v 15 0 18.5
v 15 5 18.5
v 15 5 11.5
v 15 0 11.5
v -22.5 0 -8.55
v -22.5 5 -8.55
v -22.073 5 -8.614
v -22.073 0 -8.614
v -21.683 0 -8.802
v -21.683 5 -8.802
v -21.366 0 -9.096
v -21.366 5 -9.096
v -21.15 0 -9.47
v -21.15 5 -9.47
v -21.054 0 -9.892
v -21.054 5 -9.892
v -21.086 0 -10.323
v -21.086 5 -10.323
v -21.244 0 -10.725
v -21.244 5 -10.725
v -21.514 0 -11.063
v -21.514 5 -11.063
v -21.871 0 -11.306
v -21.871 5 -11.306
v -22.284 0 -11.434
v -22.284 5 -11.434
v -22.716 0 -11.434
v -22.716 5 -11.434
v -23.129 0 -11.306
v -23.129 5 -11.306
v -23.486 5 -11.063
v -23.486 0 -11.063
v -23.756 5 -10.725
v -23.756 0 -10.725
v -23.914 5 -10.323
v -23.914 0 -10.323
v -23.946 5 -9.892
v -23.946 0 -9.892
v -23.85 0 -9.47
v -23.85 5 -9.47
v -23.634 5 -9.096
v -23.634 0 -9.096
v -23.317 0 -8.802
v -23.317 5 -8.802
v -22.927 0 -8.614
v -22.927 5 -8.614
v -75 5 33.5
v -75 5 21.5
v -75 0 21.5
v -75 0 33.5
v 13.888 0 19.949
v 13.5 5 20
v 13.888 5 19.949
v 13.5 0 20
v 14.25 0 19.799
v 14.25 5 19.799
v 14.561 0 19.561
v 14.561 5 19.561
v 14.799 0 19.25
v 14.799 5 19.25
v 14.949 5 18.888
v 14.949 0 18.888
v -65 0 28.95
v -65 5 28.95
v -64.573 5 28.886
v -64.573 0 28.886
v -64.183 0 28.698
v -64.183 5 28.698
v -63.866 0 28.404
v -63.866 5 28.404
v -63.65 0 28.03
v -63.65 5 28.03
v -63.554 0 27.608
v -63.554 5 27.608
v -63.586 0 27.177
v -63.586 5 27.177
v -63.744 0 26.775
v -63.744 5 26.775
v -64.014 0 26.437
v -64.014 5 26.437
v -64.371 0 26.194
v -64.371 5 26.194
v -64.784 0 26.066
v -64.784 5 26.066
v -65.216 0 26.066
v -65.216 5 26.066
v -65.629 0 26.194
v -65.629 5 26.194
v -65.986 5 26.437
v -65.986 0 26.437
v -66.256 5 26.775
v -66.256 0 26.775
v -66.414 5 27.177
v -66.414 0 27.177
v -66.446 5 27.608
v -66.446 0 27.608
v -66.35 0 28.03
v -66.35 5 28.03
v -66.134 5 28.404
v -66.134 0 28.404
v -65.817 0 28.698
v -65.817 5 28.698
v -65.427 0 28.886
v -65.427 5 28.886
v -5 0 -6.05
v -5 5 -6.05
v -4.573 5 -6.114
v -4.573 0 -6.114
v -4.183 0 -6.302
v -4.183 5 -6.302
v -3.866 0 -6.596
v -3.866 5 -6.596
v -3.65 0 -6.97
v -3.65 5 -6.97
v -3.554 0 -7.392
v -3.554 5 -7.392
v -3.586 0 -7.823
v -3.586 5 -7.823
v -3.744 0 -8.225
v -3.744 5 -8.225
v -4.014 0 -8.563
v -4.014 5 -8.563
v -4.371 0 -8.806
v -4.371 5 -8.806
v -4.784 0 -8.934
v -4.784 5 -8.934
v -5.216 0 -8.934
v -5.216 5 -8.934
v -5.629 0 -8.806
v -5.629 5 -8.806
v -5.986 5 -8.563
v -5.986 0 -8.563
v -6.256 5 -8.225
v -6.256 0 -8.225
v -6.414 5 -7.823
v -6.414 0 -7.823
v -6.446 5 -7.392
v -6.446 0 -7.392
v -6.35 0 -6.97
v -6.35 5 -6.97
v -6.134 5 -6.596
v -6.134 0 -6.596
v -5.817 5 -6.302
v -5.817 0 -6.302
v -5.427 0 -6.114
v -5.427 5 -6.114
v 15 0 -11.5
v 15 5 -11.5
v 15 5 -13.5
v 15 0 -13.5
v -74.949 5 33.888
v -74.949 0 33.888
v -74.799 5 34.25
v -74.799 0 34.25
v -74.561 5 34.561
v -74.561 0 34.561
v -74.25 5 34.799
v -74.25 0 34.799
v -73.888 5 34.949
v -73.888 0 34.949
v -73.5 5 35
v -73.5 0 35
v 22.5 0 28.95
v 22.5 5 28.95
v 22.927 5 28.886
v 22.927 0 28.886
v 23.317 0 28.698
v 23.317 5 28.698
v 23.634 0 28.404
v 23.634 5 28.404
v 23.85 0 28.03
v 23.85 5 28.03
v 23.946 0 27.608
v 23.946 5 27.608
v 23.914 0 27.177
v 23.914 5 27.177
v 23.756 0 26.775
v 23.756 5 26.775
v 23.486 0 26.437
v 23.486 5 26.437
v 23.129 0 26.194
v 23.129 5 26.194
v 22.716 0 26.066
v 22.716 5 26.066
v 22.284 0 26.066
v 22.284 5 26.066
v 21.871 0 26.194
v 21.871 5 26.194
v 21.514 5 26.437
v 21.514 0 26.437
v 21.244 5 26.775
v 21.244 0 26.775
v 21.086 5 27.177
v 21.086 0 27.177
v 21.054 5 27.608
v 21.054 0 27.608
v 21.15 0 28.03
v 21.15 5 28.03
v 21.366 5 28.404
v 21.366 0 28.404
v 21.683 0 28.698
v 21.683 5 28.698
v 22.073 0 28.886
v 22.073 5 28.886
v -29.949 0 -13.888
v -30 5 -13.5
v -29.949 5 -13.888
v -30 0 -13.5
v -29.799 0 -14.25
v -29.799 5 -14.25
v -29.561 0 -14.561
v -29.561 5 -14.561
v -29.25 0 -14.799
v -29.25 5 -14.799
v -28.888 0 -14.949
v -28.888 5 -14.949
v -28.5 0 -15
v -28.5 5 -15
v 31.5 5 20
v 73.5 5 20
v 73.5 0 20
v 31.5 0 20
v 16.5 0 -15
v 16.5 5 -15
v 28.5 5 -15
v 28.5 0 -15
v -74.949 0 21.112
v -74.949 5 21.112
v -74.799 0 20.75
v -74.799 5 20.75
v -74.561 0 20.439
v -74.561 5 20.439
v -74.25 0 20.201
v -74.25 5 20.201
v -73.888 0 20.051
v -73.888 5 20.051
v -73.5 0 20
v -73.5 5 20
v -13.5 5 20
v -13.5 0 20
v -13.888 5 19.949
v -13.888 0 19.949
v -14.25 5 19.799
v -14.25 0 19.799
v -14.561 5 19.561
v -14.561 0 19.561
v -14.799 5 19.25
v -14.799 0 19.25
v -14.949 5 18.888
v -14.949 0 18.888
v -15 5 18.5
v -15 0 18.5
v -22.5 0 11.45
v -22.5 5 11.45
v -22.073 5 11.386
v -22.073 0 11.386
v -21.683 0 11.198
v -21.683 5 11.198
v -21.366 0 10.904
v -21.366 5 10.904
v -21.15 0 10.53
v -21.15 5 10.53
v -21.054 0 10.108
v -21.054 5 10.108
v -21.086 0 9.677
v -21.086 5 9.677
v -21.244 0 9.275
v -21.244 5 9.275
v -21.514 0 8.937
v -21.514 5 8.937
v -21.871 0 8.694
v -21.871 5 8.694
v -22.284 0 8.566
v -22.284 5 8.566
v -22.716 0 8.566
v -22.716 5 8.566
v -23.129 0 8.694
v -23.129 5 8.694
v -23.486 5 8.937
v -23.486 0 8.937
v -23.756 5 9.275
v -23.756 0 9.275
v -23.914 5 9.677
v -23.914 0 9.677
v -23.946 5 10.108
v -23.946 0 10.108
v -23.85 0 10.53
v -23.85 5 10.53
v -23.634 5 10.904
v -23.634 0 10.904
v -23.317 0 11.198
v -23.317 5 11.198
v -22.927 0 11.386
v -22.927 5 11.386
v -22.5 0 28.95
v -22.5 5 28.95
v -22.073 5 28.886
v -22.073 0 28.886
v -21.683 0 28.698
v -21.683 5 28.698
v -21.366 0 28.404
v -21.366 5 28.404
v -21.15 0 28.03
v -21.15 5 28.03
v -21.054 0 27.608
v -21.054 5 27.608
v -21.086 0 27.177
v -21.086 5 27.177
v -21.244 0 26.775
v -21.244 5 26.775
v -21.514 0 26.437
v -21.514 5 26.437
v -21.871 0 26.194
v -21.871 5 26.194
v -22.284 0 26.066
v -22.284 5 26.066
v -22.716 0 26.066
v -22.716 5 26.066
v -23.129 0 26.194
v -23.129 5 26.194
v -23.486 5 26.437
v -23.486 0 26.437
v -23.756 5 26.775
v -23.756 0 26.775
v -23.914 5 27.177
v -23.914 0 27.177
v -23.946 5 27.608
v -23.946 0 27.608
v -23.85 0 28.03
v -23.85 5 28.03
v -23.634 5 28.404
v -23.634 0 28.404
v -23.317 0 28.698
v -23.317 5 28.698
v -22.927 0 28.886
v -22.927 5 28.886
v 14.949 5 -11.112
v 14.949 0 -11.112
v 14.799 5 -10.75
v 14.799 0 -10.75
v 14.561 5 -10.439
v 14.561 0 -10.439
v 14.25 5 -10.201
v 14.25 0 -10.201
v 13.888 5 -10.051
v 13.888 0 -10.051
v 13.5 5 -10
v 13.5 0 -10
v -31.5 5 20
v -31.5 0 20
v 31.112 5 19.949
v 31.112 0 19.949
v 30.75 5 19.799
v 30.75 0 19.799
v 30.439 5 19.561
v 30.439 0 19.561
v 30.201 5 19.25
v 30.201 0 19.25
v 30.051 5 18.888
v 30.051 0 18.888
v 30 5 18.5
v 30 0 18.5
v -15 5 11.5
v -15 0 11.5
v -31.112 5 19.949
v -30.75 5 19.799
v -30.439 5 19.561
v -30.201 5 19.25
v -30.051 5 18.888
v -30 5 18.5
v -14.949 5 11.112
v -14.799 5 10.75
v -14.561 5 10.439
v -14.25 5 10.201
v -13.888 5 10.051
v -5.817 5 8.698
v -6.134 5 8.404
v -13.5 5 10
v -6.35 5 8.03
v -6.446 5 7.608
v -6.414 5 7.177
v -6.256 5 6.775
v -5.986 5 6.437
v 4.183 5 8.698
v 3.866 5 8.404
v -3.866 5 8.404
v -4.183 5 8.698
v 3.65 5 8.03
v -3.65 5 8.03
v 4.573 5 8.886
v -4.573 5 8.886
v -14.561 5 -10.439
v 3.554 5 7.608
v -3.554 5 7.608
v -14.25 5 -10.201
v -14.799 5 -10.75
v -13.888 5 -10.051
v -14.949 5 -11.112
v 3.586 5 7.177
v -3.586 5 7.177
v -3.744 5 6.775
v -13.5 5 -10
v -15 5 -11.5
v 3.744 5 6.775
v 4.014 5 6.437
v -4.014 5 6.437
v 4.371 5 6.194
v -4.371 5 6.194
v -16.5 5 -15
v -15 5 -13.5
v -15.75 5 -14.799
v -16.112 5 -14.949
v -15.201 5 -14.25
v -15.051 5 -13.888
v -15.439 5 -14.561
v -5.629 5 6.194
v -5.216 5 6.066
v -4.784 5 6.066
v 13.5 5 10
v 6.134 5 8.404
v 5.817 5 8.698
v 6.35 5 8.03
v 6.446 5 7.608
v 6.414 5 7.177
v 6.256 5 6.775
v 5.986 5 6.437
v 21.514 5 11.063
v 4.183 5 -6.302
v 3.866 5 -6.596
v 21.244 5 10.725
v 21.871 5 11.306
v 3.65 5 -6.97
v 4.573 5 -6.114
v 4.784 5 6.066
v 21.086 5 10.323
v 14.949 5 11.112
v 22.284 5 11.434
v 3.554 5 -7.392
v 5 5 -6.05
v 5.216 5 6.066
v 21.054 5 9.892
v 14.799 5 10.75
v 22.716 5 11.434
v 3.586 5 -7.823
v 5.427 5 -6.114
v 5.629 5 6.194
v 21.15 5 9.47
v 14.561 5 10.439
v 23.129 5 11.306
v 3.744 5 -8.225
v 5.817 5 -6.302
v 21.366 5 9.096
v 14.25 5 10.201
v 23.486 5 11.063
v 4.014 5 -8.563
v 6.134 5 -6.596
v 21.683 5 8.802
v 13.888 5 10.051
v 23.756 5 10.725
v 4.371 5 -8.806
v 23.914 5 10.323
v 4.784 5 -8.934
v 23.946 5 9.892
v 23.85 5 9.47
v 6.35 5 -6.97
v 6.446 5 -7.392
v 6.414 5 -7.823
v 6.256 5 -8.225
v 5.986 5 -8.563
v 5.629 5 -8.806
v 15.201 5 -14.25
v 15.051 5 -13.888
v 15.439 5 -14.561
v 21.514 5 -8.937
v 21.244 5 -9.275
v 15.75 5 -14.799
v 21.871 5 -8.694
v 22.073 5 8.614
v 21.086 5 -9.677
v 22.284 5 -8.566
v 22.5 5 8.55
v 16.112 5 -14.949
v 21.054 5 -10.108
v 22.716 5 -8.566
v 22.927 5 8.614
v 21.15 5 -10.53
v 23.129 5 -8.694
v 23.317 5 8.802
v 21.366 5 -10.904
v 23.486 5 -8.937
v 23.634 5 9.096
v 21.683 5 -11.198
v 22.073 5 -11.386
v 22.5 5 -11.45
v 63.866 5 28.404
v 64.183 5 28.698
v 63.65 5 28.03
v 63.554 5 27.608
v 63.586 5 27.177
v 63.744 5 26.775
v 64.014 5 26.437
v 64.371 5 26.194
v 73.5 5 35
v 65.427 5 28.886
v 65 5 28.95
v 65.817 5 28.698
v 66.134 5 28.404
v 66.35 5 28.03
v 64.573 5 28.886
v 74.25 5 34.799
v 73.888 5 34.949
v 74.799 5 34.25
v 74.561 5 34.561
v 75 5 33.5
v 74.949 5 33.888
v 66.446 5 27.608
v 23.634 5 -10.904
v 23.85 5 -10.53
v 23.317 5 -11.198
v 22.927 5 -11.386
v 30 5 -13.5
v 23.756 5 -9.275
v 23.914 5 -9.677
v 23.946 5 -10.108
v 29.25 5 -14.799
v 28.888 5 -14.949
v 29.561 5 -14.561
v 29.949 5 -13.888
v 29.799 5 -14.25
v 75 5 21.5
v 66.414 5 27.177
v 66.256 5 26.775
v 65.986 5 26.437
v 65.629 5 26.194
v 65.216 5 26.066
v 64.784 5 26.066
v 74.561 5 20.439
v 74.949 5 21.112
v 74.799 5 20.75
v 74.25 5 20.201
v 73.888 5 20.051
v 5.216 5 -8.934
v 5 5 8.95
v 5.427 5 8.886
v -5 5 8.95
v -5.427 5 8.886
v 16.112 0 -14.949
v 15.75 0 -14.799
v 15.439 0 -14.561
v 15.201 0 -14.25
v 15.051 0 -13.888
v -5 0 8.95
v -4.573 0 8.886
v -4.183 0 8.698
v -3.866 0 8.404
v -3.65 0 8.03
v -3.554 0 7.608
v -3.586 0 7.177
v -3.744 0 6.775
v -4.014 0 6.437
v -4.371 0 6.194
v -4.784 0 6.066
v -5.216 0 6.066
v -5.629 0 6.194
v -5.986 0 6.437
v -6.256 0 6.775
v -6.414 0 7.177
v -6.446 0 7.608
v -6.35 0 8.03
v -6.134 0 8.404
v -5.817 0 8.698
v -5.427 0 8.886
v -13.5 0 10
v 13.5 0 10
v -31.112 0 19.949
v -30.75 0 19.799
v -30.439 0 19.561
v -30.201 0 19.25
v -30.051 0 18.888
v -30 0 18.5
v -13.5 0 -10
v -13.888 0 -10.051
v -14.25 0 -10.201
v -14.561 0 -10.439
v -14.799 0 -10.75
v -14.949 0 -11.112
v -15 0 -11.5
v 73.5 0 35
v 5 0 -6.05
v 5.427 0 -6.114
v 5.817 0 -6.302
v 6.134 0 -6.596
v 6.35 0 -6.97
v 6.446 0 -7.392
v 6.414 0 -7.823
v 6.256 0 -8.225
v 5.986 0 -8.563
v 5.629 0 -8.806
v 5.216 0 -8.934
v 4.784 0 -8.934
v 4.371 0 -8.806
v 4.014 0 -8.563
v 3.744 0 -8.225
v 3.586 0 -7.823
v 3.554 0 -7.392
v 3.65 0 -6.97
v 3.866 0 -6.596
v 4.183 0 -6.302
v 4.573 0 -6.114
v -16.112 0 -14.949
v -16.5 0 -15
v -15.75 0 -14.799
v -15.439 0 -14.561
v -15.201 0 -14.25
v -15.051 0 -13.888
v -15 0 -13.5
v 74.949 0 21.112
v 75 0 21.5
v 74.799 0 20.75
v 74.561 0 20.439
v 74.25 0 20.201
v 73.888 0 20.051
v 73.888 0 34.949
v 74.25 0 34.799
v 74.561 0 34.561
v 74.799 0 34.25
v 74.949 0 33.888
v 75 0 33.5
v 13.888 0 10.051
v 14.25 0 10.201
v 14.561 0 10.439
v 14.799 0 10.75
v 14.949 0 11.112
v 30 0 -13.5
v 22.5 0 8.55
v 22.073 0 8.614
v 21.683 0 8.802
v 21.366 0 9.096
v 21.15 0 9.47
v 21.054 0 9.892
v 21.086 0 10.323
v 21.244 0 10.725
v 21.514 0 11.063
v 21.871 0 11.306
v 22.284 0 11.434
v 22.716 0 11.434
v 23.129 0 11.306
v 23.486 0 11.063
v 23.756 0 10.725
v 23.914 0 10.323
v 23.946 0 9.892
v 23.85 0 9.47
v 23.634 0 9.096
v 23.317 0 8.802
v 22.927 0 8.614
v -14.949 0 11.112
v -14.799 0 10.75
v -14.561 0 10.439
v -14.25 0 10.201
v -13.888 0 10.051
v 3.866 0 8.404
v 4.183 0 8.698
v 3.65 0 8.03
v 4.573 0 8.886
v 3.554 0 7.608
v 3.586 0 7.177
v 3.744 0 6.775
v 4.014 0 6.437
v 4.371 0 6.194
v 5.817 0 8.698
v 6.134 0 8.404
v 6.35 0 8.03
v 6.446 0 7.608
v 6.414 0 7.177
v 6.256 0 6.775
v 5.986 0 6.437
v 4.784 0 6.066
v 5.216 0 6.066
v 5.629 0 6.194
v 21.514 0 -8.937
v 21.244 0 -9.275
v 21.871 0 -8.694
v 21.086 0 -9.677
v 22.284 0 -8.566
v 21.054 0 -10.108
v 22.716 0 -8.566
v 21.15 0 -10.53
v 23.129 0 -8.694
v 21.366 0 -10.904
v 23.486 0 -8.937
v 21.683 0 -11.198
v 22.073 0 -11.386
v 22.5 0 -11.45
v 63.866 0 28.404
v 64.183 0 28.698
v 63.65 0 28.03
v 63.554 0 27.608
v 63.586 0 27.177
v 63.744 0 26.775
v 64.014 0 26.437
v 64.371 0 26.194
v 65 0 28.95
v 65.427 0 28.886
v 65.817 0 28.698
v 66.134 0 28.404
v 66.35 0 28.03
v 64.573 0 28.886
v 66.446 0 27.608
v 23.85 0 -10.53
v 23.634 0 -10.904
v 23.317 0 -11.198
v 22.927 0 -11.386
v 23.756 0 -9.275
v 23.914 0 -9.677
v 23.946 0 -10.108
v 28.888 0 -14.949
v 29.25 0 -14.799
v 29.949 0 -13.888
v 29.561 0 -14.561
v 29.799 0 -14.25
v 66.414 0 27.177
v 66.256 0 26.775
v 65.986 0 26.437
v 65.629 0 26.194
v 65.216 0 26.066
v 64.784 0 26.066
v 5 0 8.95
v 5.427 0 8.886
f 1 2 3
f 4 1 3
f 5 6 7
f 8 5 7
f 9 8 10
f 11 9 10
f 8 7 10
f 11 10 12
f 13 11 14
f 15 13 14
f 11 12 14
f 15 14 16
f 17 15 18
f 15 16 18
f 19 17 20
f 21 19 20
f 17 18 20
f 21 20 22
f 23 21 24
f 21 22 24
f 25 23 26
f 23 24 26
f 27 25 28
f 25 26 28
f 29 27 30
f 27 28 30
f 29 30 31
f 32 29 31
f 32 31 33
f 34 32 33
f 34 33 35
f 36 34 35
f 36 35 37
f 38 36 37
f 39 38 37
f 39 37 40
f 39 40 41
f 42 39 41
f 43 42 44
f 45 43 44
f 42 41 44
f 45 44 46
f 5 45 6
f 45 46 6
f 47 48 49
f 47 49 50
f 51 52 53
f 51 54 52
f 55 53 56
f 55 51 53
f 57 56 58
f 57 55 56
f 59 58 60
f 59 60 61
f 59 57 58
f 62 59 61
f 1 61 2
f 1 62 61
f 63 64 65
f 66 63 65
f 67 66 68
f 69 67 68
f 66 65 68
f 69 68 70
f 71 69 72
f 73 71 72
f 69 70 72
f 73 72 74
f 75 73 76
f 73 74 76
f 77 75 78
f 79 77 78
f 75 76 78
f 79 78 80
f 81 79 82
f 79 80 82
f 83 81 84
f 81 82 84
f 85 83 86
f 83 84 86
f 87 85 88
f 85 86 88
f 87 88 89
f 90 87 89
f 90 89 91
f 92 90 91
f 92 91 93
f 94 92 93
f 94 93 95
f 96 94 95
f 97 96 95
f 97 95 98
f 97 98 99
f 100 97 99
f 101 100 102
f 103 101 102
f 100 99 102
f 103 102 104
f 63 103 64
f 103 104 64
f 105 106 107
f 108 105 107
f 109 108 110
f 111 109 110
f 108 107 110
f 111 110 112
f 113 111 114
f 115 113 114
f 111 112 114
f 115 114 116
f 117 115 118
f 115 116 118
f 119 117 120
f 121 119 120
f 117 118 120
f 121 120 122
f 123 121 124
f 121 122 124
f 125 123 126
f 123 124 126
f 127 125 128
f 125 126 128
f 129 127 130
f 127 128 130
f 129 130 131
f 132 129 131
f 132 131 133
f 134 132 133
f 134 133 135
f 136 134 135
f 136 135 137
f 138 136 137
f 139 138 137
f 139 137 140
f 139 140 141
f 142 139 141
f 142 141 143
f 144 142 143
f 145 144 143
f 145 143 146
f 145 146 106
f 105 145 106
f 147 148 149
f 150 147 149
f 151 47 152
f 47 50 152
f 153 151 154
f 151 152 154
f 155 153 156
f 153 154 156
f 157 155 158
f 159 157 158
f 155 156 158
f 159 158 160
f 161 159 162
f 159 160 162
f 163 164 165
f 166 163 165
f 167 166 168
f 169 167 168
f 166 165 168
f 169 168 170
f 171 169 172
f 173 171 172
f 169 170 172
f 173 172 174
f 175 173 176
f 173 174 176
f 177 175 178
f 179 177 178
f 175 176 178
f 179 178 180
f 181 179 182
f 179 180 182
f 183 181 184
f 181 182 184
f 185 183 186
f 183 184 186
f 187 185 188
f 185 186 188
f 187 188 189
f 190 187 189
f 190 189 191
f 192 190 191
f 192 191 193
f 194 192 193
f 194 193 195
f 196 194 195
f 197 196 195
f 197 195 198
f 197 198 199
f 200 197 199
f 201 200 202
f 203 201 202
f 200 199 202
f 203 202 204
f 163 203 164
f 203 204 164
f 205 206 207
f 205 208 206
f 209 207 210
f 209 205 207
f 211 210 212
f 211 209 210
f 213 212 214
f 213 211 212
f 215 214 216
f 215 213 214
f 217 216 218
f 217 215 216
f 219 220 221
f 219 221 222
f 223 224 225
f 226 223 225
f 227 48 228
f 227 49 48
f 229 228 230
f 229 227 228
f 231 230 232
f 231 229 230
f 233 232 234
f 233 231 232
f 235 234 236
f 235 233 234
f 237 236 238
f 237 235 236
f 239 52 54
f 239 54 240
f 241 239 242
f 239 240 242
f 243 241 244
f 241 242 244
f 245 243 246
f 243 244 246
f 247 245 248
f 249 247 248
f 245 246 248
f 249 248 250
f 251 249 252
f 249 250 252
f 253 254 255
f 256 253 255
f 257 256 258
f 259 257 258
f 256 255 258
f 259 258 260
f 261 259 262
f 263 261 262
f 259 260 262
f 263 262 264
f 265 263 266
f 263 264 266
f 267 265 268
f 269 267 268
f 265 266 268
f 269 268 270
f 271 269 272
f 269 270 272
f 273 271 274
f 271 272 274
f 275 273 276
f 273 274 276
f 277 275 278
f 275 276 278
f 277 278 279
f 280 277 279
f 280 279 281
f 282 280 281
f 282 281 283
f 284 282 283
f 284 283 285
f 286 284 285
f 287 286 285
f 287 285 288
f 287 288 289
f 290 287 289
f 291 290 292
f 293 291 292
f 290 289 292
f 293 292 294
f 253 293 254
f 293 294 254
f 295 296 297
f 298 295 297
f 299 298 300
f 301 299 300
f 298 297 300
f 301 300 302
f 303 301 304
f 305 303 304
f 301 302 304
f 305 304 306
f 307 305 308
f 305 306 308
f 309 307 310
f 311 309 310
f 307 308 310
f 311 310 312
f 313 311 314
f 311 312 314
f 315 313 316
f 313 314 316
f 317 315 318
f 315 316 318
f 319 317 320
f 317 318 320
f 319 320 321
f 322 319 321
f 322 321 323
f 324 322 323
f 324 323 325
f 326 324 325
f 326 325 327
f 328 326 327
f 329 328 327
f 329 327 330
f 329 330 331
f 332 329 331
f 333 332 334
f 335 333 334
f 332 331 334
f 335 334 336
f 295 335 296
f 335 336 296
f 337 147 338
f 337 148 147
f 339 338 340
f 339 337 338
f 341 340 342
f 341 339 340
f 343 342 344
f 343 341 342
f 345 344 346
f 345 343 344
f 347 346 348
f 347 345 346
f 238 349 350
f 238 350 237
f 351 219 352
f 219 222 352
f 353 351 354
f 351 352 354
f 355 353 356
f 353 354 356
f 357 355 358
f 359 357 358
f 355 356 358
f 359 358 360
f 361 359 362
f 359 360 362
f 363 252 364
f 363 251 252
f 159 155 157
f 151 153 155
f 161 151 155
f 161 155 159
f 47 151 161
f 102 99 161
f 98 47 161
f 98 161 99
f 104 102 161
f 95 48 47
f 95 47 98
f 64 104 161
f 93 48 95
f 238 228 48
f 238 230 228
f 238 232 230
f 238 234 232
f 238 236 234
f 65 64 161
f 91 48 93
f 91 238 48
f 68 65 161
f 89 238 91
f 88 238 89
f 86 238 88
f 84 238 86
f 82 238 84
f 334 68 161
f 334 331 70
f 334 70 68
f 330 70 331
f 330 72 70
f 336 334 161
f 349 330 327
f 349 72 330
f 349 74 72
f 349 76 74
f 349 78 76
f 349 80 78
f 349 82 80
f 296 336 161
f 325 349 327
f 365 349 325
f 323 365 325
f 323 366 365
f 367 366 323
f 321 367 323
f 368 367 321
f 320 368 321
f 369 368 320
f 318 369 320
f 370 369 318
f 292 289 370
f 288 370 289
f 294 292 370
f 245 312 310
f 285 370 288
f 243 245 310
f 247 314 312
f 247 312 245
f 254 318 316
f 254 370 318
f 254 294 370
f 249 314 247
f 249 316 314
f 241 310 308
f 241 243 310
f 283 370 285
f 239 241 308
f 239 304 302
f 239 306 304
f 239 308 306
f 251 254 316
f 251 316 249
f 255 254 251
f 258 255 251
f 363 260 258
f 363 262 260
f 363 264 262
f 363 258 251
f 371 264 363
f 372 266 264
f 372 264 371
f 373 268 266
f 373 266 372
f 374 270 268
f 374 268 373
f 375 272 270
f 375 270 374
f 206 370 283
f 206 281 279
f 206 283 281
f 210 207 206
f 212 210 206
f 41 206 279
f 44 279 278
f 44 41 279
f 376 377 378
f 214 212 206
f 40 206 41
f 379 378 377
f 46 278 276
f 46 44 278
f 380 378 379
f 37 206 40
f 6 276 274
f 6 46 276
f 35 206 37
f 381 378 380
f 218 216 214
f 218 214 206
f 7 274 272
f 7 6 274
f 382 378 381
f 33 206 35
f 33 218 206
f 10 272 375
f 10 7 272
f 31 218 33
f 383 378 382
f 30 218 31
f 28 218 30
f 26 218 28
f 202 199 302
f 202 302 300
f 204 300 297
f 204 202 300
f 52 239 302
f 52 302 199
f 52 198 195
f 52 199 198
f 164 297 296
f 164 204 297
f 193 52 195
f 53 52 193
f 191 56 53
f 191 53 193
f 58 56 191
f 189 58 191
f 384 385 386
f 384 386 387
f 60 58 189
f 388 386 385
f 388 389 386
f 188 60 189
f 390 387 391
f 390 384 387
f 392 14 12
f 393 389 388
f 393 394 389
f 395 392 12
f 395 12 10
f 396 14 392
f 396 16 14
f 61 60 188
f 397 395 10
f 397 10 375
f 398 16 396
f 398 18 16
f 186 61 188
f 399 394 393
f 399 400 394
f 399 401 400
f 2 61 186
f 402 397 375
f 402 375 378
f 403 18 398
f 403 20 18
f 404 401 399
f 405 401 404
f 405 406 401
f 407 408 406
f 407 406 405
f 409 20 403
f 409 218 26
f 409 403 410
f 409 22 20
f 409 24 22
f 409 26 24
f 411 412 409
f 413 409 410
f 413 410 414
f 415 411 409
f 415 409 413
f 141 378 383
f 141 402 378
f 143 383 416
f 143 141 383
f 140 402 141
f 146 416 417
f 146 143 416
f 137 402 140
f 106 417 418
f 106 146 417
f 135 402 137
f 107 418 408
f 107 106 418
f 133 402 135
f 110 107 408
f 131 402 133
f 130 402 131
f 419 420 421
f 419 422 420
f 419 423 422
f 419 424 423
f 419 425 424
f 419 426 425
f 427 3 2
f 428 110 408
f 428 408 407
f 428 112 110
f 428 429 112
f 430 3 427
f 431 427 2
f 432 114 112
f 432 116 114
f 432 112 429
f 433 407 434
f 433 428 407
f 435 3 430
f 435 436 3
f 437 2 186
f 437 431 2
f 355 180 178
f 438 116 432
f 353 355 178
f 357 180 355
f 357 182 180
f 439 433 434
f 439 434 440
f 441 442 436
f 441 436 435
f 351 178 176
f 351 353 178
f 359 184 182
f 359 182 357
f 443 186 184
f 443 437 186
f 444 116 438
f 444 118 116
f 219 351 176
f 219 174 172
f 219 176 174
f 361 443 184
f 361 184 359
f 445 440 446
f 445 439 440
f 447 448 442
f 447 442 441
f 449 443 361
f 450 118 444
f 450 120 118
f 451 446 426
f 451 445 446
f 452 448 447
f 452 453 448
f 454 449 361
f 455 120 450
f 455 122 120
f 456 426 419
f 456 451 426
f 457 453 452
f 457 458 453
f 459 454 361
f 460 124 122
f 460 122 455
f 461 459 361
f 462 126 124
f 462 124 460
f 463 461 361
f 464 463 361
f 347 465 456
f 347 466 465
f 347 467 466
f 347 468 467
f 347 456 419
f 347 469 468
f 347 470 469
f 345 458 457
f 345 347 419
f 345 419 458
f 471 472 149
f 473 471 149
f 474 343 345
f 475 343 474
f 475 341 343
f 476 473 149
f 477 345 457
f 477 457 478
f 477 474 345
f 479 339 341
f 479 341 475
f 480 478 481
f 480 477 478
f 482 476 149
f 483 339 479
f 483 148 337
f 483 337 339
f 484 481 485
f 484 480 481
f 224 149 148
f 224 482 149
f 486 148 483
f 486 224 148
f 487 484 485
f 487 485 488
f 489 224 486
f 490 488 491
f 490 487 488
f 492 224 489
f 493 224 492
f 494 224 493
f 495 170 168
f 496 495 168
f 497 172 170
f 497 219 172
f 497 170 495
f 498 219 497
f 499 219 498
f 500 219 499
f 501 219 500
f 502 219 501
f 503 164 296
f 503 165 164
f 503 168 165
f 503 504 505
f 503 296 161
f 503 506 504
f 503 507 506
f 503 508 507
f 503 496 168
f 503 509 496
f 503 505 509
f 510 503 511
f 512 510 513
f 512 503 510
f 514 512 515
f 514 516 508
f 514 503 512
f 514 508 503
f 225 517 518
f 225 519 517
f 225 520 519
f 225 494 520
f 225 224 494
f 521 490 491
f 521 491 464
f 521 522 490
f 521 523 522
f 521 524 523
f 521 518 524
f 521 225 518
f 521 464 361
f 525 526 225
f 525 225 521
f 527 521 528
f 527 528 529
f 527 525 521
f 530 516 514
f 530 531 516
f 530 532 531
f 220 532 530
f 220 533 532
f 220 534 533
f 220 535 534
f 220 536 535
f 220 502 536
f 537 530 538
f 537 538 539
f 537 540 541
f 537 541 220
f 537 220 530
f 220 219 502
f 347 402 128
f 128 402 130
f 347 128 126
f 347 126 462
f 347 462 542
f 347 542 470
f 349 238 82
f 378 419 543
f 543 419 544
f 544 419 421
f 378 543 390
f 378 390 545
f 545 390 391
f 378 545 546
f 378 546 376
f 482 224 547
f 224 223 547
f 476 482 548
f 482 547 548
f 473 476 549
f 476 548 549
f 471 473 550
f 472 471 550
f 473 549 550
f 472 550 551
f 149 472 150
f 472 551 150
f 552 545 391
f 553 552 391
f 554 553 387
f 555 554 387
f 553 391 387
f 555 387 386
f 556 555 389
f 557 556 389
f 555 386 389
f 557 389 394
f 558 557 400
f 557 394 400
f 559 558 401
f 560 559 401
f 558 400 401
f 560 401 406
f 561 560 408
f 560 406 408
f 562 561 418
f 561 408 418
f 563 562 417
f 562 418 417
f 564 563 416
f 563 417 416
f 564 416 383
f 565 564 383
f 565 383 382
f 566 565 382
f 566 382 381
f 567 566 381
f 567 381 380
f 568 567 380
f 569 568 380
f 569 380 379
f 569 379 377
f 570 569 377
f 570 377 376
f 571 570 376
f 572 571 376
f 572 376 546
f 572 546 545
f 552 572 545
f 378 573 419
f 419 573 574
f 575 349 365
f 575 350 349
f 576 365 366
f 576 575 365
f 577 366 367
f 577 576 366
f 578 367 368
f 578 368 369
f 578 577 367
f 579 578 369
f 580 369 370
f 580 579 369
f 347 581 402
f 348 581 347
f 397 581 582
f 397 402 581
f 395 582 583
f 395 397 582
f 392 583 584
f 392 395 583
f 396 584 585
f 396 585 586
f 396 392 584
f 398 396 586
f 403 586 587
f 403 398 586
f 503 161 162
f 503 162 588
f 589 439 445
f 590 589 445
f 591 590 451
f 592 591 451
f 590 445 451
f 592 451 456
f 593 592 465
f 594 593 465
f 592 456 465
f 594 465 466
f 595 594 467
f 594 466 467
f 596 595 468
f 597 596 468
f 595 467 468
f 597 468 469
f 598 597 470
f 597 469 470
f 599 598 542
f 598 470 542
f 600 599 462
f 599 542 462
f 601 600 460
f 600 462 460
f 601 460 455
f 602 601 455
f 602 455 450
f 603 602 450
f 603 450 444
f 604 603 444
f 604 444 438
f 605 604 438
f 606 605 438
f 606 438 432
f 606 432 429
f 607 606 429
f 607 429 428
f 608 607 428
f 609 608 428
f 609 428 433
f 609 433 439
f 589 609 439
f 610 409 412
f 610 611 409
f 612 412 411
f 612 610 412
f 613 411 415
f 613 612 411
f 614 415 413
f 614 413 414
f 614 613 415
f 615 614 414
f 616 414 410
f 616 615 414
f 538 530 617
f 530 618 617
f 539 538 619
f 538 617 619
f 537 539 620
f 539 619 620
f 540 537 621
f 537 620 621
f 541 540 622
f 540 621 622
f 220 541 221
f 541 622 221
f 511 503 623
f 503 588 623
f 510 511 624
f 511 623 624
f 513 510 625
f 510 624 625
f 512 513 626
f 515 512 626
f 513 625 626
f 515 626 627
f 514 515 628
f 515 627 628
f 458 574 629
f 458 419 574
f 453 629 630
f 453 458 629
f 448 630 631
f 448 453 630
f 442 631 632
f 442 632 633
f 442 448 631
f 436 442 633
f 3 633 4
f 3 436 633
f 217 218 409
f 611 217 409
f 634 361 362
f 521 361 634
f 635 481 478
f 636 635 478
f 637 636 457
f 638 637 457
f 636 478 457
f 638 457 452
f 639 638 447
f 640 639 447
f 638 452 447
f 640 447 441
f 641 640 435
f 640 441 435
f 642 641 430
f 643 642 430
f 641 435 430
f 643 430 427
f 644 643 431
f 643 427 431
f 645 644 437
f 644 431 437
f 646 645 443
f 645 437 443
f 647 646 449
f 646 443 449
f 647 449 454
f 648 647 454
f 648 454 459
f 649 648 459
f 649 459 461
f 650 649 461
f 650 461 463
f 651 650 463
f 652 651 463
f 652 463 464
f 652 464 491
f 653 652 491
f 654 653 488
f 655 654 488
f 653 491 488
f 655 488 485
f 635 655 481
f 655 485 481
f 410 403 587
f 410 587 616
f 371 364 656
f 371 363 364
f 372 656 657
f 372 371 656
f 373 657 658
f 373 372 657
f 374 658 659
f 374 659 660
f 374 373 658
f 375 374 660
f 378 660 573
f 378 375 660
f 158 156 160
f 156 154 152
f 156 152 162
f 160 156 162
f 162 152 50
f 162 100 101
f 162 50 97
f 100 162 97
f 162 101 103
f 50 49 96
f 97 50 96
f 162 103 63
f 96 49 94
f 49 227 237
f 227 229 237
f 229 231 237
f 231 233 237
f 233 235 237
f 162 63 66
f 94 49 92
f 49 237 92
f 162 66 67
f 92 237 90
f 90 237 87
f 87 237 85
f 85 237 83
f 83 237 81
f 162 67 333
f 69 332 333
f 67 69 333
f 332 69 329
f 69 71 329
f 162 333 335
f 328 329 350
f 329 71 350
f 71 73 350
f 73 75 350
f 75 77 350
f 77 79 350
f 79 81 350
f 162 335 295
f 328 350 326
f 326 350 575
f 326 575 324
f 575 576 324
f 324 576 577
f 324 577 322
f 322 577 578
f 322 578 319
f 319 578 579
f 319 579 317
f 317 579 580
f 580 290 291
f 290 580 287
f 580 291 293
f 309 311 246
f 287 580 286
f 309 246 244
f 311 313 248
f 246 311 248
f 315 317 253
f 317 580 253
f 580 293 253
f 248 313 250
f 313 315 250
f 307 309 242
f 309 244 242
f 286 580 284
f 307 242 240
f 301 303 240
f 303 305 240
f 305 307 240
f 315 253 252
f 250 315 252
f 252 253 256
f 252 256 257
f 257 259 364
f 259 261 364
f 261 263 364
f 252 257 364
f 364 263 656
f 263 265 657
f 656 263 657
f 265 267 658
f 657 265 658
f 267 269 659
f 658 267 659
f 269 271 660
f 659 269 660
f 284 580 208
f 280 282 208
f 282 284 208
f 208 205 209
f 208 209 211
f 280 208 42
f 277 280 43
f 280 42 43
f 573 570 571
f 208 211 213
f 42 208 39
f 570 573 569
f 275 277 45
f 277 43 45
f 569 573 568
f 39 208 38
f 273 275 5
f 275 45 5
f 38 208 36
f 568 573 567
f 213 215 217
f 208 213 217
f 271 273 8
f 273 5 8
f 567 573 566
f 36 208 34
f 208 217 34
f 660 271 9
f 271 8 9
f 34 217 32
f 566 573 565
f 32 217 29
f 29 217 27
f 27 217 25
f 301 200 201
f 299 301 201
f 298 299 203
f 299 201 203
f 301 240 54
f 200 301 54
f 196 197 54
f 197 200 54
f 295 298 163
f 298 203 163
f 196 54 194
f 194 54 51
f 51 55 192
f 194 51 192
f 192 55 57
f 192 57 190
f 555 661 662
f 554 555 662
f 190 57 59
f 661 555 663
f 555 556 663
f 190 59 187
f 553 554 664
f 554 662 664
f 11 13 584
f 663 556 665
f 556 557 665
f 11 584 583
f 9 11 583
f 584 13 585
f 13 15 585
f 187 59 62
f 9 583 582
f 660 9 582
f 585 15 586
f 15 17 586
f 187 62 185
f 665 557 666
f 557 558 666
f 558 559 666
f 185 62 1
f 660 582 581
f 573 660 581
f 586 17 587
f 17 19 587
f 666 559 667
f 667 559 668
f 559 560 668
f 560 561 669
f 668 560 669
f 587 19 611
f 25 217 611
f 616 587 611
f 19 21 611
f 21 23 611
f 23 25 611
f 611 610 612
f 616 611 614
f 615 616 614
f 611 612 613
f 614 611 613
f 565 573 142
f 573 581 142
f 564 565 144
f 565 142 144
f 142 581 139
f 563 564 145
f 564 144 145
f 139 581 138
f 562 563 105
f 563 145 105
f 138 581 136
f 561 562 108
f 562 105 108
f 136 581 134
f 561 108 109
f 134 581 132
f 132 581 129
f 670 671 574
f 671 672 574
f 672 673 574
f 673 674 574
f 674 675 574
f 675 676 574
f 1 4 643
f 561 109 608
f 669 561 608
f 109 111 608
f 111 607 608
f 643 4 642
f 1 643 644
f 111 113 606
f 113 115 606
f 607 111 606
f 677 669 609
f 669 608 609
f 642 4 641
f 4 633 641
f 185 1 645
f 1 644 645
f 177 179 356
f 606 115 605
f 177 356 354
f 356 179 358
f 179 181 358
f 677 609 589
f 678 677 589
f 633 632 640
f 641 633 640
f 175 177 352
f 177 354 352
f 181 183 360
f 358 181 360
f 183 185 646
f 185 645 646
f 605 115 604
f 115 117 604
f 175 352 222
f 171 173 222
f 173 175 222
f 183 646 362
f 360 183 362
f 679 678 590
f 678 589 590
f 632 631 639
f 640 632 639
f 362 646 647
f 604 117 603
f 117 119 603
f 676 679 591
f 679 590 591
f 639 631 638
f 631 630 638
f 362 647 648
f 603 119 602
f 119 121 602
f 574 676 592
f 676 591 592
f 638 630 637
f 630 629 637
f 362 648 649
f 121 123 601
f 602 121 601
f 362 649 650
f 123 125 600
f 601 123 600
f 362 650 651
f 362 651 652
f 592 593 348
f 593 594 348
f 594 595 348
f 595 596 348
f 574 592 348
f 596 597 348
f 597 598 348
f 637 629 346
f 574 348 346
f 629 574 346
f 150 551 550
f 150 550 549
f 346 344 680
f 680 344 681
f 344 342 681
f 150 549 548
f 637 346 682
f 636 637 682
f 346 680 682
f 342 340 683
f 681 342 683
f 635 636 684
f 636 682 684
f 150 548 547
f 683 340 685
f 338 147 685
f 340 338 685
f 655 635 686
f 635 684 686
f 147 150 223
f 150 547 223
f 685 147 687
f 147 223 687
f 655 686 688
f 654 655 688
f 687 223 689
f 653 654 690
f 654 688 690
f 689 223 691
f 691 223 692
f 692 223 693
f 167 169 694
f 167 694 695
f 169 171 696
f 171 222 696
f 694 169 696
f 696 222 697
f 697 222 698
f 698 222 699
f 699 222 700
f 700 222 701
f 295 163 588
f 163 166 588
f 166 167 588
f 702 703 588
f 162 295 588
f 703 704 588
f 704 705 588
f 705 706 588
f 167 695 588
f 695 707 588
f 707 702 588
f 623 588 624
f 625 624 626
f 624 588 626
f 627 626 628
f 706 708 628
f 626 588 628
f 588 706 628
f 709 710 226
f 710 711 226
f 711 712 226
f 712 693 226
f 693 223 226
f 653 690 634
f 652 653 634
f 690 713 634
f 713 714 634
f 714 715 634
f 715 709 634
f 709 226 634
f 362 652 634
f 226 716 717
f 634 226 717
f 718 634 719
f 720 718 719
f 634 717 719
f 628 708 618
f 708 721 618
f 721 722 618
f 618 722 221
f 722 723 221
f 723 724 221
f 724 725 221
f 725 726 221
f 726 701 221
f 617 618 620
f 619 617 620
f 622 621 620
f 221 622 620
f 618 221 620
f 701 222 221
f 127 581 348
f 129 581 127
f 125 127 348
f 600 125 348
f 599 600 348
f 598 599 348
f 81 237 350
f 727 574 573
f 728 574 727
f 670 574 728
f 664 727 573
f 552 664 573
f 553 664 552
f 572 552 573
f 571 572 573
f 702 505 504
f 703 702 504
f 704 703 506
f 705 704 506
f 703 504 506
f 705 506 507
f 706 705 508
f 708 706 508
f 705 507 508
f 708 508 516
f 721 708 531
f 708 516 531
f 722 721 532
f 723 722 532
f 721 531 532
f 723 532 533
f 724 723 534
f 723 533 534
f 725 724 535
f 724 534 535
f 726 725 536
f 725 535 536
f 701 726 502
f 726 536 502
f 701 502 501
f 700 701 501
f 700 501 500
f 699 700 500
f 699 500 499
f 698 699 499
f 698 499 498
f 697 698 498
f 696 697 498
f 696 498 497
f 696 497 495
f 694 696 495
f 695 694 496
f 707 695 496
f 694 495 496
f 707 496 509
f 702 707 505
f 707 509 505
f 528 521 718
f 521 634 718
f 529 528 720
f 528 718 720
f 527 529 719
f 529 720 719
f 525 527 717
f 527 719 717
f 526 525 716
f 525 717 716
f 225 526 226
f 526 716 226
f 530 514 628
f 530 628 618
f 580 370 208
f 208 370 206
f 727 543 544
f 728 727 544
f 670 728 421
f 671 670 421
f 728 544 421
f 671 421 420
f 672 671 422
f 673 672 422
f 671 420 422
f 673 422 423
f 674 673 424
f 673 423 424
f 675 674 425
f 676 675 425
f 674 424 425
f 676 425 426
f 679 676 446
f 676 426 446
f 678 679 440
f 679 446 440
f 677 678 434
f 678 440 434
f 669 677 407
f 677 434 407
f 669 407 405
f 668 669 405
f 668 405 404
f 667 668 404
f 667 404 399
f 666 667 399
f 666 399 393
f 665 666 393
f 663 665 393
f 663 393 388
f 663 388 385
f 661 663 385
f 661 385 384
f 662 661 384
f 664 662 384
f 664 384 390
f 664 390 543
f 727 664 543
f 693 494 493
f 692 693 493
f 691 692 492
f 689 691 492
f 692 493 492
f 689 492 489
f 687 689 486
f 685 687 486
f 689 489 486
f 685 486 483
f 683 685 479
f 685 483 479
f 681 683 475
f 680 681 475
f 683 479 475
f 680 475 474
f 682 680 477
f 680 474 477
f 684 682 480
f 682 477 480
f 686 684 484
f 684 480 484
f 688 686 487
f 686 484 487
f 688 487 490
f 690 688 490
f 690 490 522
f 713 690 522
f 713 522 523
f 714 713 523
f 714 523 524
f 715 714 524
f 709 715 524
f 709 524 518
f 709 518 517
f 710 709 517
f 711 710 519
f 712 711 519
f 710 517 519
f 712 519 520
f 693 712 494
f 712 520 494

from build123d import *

# Parameters (mm, degrees)
SKETCH_1_W          = 30
SKETCH_1_H          = 20
EXTRUDE_1_DEPTH     = 5
SKETCH_2_R          = 1.45
CUT_EXTRUDE_1_DEPTH = 19.708286934
SKETCH_3_W          = 15
SKETCH_3_H          = 30
SKETCH_3_R          = 1.45
EXTRUDE_2_DEPTH     = 5
SKETCH_6_W          = 15
SKETCH_6_H          = 5
EXTRUDE_4_DEPTH     = 5
SKETCH_4_R          = 1.45
EXTRUDE_3_DEPTH     = 5
FILLET_2_R          = 1.5


with BuildPart() as part:
    # 草图1 → 凸台-拉伸1 (new body)
    with BuildSketch(Plane(origin=(0, 0, 0), x_dir=(1, 0, 0), z_dir=(0, 1, 0))):
        Rectangle(SKETCH_1_W, SKETCH_1_H)
    extrude(amount=EXTRUDE_1_DEPTH)

    # 草图2 → 切除-拉伸1 (cut, through all)
    with BuildSketch(Plane(origin=(0, 5, 0), x_dir=(1, 0, 0), z_dir=(0, 1, 0))):
        with Locations(Location((-5, 7.5, 0), (0, 0, 270))):
            Circle(SKETCH_2_R)
        with Locations(Location((5, 7.5, 0), (0, 0, 270))):
            Circle(SKETCH_2_R)
        with Locations(Location((5, -7.5, 0), (0, 0, 270))):
            Circle(SKETCH_2_R)
        with Locations(Location((-5, -7.5, 0), (0, 0, 270))):
            Circle(SKETCH_2_R)
    extrude(amount=-CUT_EXTRUDE_1_DEPTH, mode=Mode.SUBTRACT)

    # 草图3 → 凸台-拉伸2 (add)
    # profile 1 of 2: a face of its own
    with BuildSketch(Plane(origin=(0, 5, 0), x_dir=(1, 0, 0), z_dir=(0, 1, 0))):
        with Locations((22.5, 0)):
            Rectangle(SKETCH_3_W, SKETCH_3_H)
        with Locations(Location((22.5, -10, 0), (0, 0, 90))):
            Circle(SKETCH_3_R, mode=Mode.SUBTRACT)
        with Locations(Location((22.5, 10, 0), (0, 0, 90))):
            Circle(SKETCH_3_R, mode=Mode.SUBTRACT)
    # profile 2 of 2: a face of its own
    with BuildSketch(Plane(origin=(0, 5, 0), x_dir=(1, 0, 0), z_dir=(0, 1, 0))):
        with Locations((-22.5, 0)):
            Rectangle(SKETCH_3_W, SKETCH_3_H)
        with Locations(Location((-22.5, 10, 0), (0, 0, 270))):
            Circle(SKETCH_3_R, mode=Mode.SUBTRACT)
        with Locations(Location((-22.5, -10, 0), (0, 0, 270))):
            Circle(SKETCH_3_R, mode=Mode.SUBTRACT)
    extrude(amount=-EXTRUDE_2_DEPTH)

    # 草图6 → 凸台-拉伸4 (add)
    with BuildSketch(Plane(origin=(0, 5, 0), x_dir=(1, 0, 0), z_dir=(0, 1, 0))):
        with Locations((-22.5, -17.5)):
            Rectangle(SKETCH_6_W, SKETCH_6_H)
        with Locations((22.5, -17.5)):
            Rectangle(SKETCH_6_W, SKETCH_6_H)
    extrude(amount=-EXTRUDE_4_DEPTH)

    # 草图4 → 凸台-拉伸3 (add)
    with BuildSketch(Plane(origin=(0, 5, 0), x_dir=(1, 0, 0), z_dir=(0, 1, 0))):
        Polygon((-30, -20), (-75, -20), (-75, -35), (75, -35), (75, -20), (30, -20), (15, -20), (-15, -20), align=None)
        with Locations(Location((-65, -27.5, 0), (0, 0, 270))):
            Circle(SKETCH_4_R, mode=Mode.SUBTRACT)
        with Locations(Location((-22.5, -27.5, 0), (0, 0, 270))):
            Circle(SKETCH_4_R, mode=Mode.SUBTRACT)
        with Locations(Location((22.5, -27.5, 0), (0, 0, 270))):
            Circle(SKETCH_4_R, mode=Mode.SUBTRACT)
        with Locations(Location((65, -27.5, 0), (0, 0, 270))):
            Circle(SKETCH_4_R, mode=Mode.SUBTRACT)
    extrude(amount=-EXTRUDE_3_DEPTH)

    # 圆角2
    fillet_2_edges = [part.edges().sort_by_distance(p)[0] for p in [
        (15, 2.5, -15),
        (30, 2.5, -15),
        (-15, 2.5, -15),
        (-30, 2.5, -15),
        (-15, 2.5, 20),
        (-30, 2.5, 20),
        (15, 2.5, 10),
        (30, 2.5, 20),
        (-15, 2.5, 10),
        (15, 2.5, 20),
        (-15, 2.5, -10),
        (15, 2.5, -10),
        (-75, 2.5, 20),
        (-75, 2.5, 35),
        (75, 2.5, 35),
        (75, 2.5, 20),
    ]]
    fillet(fillet_2_edges, radius=FILLET_2_R)


solid = part.part
